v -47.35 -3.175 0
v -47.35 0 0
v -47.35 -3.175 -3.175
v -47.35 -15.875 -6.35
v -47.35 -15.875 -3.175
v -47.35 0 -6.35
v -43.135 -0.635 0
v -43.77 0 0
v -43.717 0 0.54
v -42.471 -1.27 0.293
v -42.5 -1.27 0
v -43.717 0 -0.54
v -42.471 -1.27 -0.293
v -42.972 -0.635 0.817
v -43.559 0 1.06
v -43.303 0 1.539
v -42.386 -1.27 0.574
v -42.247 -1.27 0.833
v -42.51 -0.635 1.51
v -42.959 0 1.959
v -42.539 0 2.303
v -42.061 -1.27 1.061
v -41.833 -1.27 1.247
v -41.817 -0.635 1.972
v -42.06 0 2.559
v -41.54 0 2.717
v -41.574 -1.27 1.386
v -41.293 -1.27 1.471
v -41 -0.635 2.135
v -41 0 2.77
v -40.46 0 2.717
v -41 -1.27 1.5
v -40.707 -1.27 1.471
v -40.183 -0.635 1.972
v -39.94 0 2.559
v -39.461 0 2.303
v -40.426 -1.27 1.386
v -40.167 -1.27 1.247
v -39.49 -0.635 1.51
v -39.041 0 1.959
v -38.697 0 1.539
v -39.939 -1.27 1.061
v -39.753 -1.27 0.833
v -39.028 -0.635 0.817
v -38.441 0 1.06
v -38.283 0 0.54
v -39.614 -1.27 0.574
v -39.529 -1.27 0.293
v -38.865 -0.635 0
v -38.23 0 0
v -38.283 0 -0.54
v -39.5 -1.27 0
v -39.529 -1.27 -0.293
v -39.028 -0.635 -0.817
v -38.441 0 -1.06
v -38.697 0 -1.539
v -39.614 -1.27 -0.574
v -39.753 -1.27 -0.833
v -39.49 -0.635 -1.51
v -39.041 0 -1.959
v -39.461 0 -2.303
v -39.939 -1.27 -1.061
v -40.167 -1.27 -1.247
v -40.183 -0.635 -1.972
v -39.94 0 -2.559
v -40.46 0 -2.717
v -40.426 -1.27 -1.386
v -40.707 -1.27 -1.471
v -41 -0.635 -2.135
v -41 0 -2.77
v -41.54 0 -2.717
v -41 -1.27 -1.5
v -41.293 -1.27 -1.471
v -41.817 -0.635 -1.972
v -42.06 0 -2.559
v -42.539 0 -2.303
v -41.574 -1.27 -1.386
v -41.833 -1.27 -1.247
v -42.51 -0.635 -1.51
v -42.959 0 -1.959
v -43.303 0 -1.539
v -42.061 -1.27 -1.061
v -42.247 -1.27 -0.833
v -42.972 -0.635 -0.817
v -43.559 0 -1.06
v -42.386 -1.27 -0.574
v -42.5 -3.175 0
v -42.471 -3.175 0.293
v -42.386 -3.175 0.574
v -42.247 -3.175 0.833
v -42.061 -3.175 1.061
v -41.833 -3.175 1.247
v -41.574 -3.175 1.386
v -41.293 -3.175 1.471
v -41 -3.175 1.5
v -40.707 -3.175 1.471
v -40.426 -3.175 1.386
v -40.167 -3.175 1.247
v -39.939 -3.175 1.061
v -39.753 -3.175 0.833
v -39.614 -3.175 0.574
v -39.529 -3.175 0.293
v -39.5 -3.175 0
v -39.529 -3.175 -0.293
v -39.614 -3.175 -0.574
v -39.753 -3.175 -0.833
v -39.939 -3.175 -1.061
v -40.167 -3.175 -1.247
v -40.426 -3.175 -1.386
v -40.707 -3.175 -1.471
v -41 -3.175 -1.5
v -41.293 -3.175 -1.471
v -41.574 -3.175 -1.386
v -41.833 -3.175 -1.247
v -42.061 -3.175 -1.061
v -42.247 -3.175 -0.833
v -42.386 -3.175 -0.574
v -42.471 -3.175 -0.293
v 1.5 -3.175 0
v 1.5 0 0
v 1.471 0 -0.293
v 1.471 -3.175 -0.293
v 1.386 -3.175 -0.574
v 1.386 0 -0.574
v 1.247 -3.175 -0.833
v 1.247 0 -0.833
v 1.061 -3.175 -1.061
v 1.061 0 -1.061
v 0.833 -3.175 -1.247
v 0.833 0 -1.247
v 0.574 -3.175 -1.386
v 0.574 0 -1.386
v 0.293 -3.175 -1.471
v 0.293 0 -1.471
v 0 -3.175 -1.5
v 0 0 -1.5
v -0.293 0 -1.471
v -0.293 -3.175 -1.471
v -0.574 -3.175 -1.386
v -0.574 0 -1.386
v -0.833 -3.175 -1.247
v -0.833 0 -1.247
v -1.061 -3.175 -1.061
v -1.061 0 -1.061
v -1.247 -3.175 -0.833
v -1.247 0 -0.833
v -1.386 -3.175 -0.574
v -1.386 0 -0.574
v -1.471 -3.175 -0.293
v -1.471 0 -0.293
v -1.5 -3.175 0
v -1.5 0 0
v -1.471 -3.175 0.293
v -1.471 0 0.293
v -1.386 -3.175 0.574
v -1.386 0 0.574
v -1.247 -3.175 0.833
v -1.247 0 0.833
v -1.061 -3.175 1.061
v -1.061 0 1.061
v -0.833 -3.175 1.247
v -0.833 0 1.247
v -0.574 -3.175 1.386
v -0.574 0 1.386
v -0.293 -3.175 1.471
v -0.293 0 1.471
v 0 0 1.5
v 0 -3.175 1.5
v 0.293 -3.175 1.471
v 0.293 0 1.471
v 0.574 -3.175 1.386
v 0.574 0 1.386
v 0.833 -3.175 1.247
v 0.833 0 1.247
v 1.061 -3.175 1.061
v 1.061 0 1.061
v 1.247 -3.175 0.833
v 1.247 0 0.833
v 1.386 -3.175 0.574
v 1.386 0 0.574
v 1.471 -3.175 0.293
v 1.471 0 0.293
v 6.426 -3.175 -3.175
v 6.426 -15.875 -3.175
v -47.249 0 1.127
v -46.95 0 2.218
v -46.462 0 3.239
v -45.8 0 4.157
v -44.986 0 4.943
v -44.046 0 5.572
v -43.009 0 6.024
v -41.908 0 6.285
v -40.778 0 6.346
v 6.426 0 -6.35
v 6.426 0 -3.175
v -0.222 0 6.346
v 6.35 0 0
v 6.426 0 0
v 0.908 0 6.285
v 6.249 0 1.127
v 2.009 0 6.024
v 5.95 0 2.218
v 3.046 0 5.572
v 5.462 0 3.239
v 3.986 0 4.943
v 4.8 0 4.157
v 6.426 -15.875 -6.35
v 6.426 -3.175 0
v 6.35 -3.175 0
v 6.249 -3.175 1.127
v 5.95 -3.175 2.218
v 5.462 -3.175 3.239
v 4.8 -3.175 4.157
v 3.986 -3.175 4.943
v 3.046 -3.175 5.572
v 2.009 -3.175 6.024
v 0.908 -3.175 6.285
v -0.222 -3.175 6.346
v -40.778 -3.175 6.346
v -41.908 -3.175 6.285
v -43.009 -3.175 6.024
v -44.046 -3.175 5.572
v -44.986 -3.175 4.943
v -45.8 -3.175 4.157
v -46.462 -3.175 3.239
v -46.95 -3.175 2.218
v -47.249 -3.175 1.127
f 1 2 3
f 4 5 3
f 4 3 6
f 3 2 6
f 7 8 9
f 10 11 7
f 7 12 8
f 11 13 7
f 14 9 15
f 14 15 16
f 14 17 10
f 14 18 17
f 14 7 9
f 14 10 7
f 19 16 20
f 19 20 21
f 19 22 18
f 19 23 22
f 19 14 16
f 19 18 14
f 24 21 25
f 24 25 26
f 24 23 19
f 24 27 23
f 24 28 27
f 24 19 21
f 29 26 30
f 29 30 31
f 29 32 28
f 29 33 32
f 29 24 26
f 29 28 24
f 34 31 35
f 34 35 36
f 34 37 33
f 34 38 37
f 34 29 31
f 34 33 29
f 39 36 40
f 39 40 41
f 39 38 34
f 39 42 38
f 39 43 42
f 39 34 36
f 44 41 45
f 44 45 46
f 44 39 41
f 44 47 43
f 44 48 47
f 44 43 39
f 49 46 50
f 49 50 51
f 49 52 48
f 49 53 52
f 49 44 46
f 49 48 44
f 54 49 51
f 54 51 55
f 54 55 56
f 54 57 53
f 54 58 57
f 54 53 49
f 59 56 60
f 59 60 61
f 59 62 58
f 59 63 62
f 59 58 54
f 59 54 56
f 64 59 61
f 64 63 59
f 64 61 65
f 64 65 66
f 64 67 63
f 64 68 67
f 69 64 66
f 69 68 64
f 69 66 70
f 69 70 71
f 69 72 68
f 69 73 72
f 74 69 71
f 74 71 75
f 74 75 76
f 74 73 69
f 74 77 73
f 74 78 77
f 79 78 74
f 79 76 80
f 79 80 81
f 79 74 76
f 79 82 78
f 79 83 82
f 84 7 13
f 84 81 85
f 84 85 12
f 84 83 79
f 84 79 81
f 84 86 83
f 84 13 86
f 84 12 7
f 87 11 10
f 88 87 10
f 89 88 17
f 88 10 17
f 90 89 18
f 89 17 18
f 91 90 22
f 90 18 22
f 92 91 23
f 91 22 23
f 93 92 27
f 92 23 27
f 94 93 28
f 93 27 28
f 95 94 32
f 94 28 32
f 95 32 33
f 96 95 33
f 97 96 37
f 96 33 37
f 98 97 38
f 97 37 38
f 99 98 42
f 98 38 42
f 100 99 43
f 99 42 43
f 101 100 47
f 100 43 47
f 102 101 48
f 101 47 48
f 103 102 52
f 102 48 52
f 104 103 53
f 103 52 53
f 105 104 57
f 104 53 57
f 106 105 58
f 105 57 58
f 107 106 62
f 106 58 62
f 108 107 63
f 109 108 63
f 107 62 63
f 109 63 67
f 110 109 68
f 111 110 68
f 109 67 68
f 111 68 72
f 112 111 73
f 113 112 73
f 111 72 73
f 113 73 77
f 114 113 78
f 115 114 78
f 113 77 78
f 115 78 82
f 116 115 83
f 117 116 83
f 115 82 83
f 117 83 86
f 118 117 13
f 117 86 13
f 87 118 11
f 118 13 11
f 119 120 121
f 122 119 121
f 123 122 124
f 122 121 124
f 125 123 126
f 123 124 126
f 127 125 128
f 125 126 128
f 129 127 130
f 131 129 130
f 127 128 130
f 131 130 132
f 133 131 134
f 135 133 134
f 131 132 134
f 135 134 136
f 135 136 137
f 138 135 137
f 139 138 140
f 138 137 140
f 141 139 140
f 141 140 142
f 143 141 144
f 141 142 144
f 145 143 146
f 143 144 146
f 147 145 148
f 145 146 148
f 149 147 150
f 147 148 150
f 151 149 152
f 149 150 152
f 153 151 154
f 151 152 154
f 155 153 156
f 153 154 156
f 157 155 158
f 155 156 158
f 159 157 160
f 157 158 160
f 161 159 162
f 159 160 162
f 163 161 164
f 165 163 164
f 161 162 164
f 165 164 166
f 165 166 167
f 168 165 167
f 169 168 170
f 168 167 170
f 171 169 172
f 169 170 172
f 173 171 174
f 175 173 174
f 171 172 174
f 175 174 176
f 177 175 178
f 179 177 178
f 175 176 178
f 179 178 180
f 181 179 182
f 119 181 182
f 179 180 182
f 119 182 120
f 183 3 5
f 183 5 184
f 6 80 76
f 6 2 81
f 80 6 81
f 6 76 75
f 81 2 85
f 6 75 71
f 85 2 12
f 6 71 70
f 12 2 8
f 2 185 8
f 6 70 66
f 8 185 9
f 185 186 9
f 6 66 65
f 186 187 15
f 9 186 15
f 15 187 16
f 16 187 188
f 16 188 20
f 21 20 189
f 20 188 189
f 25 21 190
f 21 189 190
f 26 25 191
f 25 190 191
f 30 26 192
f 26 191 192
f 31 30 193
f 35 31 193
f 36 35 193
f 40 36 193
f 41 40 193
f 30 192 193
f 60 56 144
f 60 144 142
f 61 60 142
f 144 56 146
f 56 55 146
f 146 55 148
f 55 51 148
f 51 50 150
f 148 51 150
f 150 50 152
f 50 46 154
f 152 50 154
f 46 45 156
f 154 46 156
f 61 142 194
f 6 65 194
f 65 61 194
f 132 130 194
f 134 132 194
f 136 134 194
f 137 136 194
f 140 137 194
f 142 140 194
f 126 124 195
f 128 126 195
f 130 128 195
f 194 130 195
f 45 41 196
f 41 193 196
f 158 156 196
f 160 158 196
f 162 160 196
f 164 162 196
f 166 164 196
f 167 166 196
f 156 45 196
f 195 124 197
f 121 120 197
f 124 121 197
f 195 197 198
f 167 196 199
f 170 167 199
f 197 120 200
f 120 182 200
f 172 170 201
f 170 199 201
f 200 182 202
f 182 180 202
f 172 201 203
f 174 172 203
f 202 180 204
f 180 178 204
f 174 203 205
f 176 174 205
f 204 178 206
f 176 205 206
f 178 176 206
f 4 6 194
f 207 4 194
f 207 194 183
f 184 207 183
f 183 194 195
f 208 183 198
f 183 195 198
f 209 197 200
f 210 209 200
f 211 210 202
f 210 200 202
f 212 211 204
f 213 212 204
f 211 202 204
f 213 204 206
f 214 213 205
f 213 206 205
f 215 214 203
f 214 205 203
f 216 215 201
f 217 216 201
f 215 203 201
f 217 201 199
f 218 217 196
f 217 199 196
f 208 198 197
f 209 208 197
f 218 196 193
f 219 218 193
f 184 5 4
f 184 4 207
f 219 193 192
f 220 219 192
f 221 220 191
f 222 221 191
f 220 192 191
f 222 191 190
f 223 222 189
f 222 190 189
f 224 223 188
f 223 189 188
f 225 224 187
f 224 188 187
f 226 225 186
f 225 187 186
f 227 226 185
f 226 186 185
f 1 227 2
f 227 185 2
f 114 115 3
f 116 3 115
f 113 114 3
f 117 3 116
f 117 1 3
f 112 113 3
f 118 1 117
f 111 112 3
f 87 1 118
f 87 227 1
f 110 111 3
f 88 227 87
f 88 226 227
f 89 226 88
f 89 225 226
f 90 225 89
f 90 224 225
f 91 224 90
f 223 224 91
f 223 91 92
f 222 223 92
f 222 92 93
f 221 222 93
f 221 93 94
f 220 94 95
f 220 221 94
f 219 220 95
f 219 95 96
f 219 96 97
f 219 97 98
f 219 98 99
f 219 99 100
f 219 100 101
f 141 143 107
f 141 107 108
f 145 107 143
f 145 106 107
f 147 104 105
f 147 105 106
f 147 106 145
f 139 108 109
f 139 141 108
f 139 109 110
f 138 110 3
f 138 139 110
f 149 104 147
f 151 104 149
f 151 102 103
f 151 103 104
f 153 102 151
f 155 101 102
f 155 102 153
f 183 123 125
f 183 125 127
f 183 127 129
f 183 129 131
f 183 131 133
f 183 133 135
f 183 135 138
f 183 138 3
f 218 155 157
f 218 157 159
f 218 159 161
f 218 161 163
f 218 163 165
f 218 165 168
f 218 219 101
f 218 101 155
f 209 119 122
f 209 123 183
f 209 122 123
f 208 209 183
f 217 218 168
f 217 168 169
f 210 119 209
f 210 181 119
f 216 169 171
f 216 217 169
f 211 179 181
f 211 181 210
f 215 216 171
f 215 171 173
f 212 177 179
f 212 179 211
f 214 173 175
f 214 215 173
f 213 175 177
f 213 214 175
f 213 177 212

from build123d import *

# Parameters (mm, degrees)
F1_DEPTH = 3.175
F2_W     = 62.6118863001
F2_H     = 3.175
F3_DEPTH = 12.7
F4_SIZE  = 1.27
F5_W     = 15.875
F5_H     = 3.175
F6_DEPTH = 4.5143370517
F7_W     = 15.875
F7_H     = 3.175
F8_DEPTH = 4.3210691154


with BuildPart() as f1:
    # F0 (on Front) → F1 (new body)
    with BuildSketch(Plane.XZ):
        with BuildLine():
            ThreePointArc((-35.500738686, -3.175), (-34.8663710031, -1.6435009364), (-34.65, 0))
            Line((-34.65, 0), (-39.5, 0))
            ThreePointArc((-39.5, 0), (-41, -1.5), (-42.5, 0))
            Line((-42.5, 0), (-47.35, 0))
            ThreePointArc((-47.35, 0), (-47.1336289969, -1.6435009364), (-46.499261314, -3.175))
            Line((-46.499261314, -3.175), (-35.500738686, -3.175))
        make_face()
        with BuildLine():
            ThreePointArc((-40.777693324, 6.346107448), (-36.4319507778, 4.4108305685), (-34.65, 0))
            Line((-34.65, 0), (-6.35, 0))
            ThreePointArc((-6.35, 0), (-4.5680492222, 4.4108305685), (-0.222306676, 6.346107448))
            Line((-0.222306676, 6.346107448), (-40.777693324, 6.346107448))
        make_face()
        with BuildLine():
            Line((-39.5, 0), (-34.65, 0))
            ThreePointArc((-34.65, 0), (-36.4319507778, 4.4108305685), (-40.777693324, 6.346107448))
            ThreePointArc((-40.777693324, 6.346107448), (-45.4108305685, 4.5680492222), (-47.35, 0))
            Line((-47.35, 0), (-42.5, 0))
            ThreePointArc((-42.5, 0), (-41, 1.5), (-39.5, 0))
        make_face()
        with BuildLine():
            ThreePointArc((-46.499261314, -3.175), (-47.1336289969, -1.6435009364), (-47.35, 0))
            Line((-47.35, 0), (-47.35, -3.175))
            Line((-47.35, -3.175), (-46.499261314, -3.175))
        make_face()
        with BuildLine():
            ThreePointArc((-0.222306676, 6.346107448), (-4.5680492222, 4.4108305685), (-6.35, 0))
            Line((-6.35, 0), (-1.5, 0))
            ThreePointArc((-1.5, 0), (0, 1.5), (1.5, 0))
            Line((1.5, 0), (6.35, 0))
            ThreePointArc((6.35, 0), (4.4108305685, 4.5680492222), (-0.222306676, 6.346107448))
        make_face()
        with BuildLine():
            Line((-1.5, 0), (-6.35, 0))
            ThreePointArc((-6.35, 0), (-6.1336289969, -1.6435009364), (-5.499261314, -3.175))
            Line((-5.499261314, -3.175), (5.499261314, -3.175))
            ThreePointArc((5.499261314, -3.175), (6.1336289969, -1.6435009364), (6.35, 0))
            Line((6.35, 0), (1.5, 0))
            ThreePointArc((1.5, 0), (0, -1.5), (-1.5, 0))
        make_face()
        with BuildLine():
            Line((-51.6710691154, -6.35), (-41, -6.35))
            ThreePointArc((-41, -6.35), (-44.175, -5.499261314), (-46.499261314, -3.175))
            Line((-46.499261314, -3.175), (-47.35, -3.175))
            Line((-47.35, -3.175), (-51.6710691154, -3.175))
            Line((-51.6710691154, -3.175), (-51.6710691154, -6.35))
        make_face()
        with BuildLine():
            Line((-5.499261314, -3.175), (-35.500738686, -3.175))
            ThreePointArc((-35.500738686, -3.175), (-37.825, -5.499261314), (-41, -6.35))
            Line((-41, -6.35), (3.51e-08, -6.35))
            ThreePointArc((3.51e-08, -6.35), (-3.1749999848, -5.4992613228), (-5.499261314, -3.175))
        make_face()
        with BuildLine():
            ThreePointArc((5.499261314, -3.175), (3.1750000152, -5.4992613052), (3.51e-08, -6.35))
            Line((3.51e-08, -6.35), (10.9408171847, -6.35))
            Line((10.9408171847, -6.35), (10.9408171847, -3.175))
            Line((10.9408171847, -3.175), (6.4264801331, -3.175))
            Line((6.4264801331, -3.175), (5.499261314, -3.175))
        make_face()
        with BuildLine():
            Line((-51.6710691154, -6.35), (-41, -6.35))
            ThreePointArc((-41, -6.35), (-44.175, -5.499261314), (-46.499261314, -3.175))
            Line((-46.499261314, -3.175), (-47.35, -3.175))
            Line((-47.35, -3.175), (-51.6710691154, -3.175))
            Line((-51.6710691154, -3.175), (-51.6710691154, -6.35))
        make_face()
        with BuildLine():
            ThreePointArc((-41, -6.35), (-37.825, -5.499261314), (-35.500738686, -3.175))
            Line((-35.500738686, -3.175), (-46.499261314, -3.175))
            ThreePointArc((-46.499261314, -3.175), (-44.175, -5.499261314), (-41, -6.35))
        make_face()
        with BuildLine():
            Line((-6.35, 0), (-34.65, 0))
            ThreePointArc((-34.65, 0), (-34.8663710031, -1.6435009364), (-35.500738686, -3.175))
            Line((-35.500738686, -3.175), (-5.499261314, -3.175))
            ThreePointArc((-5.499261314, -3.175), (-6.1336289969, -1.6435009364), (-6.35, 0))
        make_face()
        with BuildLine():
            Line((5.499261314, -3.175), (-5.499261314, -3.175))
            ThreePointArc((-5.499261314, -3.175), (-3.1749999848, -5.4992613228), (3.51e-08, -6.35))
            ThreePointArc((3.51e-08, -6.35), (3.1750000152, -5.4992613052), (5.499261314, -3.175))
        make_face()
        with BuildLine():
            ThreePointArc((5.499261314, -3.175), (3.1750000152, -5.4992613052), (3.51e-08, -6.35))
            Line((3.51e-08, -6.35), (10.9408171847, -6.35))
            Line((10.9408171847, -6.35), (10.9408171847, -3.175))
            Line((10.9408171847, -3.175), (6.4264801331, -3.175))
            Line((6.4264801331, -3.175), (5.499261314, -3.175))
        make_face()
        with BuildLine():
            Line((6.4264801331, 0), (6.35, 0))
            ThreePointArc((6.35, 0), (6.1336289969, -1.6435009364), (5.499261314, -3.175))
            Line((5.499261314, -3.175), (6.4264801331, -3.175))
            Line((6.4264801331, -3.175), (6.4264801331, 0))
        make_face()
    extrude(amount=F1_DEPTH)

    # F2 (on face) → F3 (join)
    with BuildSketch(Plane.XZ.offset(3.175)):
        with Locations((-20.3651259653, -4.7625)):
            Rectangle(F2_W, F2_H)
    extrude(amount=F3_DEPTH)

    # F4
    f4_edges = [f1.edges().sort_by_distance(p)[0] for p in [
        (-39.5, 0, 0),
    ]]
    chamfer(f4_edges, length=F4_SIZE)

    # F5 (on face) → F6 (cut, through all)
    with BuildSketch(Plane.YZ.offset(10.9408171847)):
        with Locations((-7.9375, -4.7625)):
            Rectangle(F5_W, F5_H)
    extrude(amount=-F6_DEPTH, mode=Mode.SUBTRACT)

    # F7 (on face) → F8 (cut, through all)
    with BuildSketch(Plane(origin=(-51.6710691154, 0, 0), x_dir=(0, -1, 0), z_dir=(-1, 0, 0))):
        with Locations((7.9375, -4.7625)):
            Rectangle(F7_W, F7_H)
    extrude(amount=-F8_DEPTH, mode=Mode.SUBTRACT)


solid = f1.part
